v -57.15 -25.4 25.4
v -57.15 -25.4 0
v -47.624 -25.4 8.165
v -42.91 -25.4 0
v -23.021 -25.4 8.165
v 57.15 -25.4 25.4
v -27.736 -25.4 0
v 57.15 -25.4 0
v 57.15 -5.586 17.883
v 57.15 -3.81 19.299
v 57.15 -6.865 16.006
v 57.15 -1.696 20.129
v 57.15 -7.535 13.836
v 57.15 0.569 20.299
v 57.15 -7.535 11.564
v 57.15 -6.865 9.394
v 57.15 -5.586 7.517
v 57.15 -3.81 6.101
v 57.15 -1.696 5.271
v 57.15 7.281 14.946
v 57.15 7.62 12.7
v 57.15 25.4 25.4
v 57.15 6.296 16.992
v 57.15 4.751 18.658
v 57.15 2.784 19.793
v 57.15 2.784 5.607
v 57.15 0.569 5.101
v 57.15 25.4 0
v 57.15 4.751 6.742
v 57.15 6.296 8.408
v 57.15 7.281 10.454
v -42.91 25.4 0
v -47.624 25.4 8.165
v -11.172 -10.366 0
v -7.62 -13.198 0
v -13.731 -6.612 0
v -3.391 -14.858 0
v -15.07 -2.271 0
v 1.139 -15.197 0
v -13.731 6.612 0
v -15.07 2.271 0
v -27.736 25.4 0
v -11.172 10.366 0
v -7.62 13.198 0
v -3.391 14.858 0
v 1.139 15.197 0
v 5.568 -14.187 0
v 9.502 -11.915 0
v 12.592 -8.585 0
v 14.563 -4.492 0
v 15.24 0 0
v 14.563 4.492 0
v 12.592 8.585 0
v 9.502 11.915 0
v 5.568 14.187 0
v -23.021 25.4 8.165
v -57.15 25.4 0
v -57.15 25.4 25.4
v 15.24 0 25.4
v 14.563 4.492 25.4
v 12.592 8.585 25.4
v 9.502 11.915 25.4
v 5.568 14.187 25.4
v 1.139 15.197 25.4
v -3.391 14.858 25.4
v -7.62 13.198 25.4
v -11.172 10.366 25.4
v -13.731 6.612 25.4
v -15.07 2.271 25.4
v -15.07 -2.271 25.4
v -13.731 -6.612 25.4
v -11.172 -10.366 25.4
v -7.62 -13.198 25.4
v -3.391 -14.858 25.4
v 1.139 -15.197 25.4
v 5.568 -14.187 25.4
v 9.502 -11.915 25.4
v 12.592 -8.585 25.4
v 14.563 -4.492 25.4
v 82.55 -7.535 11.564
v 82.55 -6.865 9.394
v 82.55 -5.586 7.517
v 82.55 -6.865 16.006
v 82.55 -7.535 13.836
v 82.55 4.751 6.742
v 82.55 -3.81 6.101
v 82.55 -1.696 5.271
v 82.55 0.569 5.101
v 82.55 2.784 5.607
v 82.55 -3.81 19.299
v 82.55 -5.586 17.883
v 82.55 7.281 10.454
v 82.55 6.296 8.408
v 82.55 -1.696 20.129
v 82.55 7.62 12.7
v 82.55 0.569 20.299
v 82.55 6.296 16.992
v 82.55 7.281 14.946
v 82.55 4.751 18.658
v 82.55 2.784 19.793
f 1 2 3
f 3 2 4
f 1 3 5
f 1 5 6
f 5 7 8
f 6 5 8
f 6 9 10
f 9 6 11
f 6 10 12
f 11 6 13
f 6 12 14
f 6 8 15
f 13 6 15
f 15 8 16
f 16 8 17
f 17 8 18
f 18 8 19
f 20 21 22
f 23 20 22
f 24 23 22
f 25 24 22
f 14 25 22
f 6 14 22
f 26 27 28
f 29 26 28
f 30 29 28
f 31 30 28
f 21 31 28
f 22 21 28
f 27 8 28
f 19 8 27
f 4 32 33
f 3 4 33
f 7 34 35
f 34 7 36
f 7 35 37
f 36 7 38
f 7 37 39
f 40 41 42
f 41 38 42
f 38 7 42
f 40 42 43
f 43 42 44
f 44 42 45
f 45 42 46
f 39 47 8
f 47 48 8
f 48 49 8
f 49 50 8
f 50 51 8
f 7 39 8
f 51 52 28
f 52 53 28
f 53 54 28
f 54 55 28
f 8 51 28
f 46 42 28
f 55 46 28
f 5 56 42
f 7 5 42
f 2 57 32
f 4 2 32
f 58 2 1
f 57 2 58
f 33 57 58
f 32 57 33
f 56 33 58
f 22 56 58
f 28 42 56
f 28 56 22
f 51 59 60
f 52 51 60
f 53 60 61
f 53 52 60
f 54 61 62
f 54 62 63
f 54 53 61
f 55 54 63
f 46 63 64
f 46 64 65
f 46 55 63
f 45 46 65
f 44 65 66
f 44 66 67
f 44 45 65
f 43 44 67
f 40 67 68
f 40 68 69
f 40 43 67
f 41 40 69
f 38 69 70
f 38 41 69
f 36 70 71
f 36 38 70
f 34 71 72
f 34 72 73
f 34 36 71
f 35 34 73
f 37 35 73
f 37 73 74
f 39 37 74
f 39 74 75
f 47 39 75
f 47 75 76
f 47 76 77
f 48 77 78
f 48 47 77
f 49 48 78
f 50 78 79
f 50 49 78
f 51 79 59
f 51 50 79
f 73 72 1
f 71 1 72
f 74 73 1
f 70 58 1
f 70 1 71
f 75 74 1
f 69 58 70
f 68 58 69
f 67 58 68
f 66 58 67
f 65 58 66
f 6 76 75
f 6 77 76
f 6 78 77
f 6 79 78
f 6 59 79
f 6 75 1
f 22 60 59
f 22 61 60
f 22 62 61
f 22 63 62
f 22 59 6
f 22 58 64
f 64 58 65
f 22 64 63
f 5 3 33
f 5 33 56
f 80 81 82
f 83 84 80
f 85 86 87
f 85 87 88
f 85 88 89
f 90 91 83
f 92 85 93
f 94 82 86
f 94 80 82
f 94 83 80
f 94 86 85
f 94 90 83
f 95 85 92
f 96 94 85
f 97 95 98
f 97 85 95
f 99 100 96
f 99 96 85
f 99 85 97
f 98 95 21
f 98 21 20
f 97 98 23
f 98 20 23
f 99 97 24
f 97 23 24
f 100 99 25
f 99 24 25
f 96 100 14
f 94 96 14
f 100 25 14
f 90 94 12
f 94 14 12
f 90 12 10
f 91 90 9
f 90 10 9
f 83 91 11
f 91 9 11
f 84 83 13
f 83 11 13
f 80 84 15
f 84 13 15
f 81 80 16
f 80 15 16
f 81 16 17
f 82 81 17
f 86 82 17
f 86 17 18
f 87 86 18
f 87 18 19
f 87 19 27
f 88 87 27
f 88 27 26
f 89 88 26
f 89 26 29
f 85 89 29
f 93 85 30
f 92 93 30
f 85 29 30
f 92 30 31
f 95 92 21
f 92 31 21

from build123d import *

# Parameters (mm, degrees)
F0_W     = 114.3
F0_H     = 50.8
F0_R     = 15.24
F1_DEPTH = 25.4
F4_DEPTH = 50.801
F5_R     = 7.62
F6_DEPTH = 25.4


# Not quite as in the source:
# - ends of sketch curves that miss each other by under 0.0002 mm in the source are joined


with BuildPart() as f1:
    # F0 (on Top) → F1 (new body)
    with BuildSketch(Plane.XY):
        Rectangle(F0_W, F0_H)
        Circle(F0_R, mode=Mode.SUBTRACT)
    extrude(amount=F1_DEPTH)

    # F3 (on face) → F4 (cut, through all)
    with BuildSketch(Plane(origin=(0, 25.4, 0), x_dir=(-1, 0, 0), z_dir=(0, 1, 0))):
        Polygon((27.7357548475, 0), (42.9095774889, 0), (47.6239210906, 8.1654826425), (23.0214107298, 8.1654835362), align=None)
    extrude(amount=-F4_DEPTH, mode=Mode.SUBTRACT)

    # F5 (on face) → F6 (join)
    with BuildSketch(Plane.YZ.offset(57.15)):
        with Locations((0, 12.7)):
            Circle(F5_R)
    extrude(amount=F6_DEPTH)


solid = f1.part
